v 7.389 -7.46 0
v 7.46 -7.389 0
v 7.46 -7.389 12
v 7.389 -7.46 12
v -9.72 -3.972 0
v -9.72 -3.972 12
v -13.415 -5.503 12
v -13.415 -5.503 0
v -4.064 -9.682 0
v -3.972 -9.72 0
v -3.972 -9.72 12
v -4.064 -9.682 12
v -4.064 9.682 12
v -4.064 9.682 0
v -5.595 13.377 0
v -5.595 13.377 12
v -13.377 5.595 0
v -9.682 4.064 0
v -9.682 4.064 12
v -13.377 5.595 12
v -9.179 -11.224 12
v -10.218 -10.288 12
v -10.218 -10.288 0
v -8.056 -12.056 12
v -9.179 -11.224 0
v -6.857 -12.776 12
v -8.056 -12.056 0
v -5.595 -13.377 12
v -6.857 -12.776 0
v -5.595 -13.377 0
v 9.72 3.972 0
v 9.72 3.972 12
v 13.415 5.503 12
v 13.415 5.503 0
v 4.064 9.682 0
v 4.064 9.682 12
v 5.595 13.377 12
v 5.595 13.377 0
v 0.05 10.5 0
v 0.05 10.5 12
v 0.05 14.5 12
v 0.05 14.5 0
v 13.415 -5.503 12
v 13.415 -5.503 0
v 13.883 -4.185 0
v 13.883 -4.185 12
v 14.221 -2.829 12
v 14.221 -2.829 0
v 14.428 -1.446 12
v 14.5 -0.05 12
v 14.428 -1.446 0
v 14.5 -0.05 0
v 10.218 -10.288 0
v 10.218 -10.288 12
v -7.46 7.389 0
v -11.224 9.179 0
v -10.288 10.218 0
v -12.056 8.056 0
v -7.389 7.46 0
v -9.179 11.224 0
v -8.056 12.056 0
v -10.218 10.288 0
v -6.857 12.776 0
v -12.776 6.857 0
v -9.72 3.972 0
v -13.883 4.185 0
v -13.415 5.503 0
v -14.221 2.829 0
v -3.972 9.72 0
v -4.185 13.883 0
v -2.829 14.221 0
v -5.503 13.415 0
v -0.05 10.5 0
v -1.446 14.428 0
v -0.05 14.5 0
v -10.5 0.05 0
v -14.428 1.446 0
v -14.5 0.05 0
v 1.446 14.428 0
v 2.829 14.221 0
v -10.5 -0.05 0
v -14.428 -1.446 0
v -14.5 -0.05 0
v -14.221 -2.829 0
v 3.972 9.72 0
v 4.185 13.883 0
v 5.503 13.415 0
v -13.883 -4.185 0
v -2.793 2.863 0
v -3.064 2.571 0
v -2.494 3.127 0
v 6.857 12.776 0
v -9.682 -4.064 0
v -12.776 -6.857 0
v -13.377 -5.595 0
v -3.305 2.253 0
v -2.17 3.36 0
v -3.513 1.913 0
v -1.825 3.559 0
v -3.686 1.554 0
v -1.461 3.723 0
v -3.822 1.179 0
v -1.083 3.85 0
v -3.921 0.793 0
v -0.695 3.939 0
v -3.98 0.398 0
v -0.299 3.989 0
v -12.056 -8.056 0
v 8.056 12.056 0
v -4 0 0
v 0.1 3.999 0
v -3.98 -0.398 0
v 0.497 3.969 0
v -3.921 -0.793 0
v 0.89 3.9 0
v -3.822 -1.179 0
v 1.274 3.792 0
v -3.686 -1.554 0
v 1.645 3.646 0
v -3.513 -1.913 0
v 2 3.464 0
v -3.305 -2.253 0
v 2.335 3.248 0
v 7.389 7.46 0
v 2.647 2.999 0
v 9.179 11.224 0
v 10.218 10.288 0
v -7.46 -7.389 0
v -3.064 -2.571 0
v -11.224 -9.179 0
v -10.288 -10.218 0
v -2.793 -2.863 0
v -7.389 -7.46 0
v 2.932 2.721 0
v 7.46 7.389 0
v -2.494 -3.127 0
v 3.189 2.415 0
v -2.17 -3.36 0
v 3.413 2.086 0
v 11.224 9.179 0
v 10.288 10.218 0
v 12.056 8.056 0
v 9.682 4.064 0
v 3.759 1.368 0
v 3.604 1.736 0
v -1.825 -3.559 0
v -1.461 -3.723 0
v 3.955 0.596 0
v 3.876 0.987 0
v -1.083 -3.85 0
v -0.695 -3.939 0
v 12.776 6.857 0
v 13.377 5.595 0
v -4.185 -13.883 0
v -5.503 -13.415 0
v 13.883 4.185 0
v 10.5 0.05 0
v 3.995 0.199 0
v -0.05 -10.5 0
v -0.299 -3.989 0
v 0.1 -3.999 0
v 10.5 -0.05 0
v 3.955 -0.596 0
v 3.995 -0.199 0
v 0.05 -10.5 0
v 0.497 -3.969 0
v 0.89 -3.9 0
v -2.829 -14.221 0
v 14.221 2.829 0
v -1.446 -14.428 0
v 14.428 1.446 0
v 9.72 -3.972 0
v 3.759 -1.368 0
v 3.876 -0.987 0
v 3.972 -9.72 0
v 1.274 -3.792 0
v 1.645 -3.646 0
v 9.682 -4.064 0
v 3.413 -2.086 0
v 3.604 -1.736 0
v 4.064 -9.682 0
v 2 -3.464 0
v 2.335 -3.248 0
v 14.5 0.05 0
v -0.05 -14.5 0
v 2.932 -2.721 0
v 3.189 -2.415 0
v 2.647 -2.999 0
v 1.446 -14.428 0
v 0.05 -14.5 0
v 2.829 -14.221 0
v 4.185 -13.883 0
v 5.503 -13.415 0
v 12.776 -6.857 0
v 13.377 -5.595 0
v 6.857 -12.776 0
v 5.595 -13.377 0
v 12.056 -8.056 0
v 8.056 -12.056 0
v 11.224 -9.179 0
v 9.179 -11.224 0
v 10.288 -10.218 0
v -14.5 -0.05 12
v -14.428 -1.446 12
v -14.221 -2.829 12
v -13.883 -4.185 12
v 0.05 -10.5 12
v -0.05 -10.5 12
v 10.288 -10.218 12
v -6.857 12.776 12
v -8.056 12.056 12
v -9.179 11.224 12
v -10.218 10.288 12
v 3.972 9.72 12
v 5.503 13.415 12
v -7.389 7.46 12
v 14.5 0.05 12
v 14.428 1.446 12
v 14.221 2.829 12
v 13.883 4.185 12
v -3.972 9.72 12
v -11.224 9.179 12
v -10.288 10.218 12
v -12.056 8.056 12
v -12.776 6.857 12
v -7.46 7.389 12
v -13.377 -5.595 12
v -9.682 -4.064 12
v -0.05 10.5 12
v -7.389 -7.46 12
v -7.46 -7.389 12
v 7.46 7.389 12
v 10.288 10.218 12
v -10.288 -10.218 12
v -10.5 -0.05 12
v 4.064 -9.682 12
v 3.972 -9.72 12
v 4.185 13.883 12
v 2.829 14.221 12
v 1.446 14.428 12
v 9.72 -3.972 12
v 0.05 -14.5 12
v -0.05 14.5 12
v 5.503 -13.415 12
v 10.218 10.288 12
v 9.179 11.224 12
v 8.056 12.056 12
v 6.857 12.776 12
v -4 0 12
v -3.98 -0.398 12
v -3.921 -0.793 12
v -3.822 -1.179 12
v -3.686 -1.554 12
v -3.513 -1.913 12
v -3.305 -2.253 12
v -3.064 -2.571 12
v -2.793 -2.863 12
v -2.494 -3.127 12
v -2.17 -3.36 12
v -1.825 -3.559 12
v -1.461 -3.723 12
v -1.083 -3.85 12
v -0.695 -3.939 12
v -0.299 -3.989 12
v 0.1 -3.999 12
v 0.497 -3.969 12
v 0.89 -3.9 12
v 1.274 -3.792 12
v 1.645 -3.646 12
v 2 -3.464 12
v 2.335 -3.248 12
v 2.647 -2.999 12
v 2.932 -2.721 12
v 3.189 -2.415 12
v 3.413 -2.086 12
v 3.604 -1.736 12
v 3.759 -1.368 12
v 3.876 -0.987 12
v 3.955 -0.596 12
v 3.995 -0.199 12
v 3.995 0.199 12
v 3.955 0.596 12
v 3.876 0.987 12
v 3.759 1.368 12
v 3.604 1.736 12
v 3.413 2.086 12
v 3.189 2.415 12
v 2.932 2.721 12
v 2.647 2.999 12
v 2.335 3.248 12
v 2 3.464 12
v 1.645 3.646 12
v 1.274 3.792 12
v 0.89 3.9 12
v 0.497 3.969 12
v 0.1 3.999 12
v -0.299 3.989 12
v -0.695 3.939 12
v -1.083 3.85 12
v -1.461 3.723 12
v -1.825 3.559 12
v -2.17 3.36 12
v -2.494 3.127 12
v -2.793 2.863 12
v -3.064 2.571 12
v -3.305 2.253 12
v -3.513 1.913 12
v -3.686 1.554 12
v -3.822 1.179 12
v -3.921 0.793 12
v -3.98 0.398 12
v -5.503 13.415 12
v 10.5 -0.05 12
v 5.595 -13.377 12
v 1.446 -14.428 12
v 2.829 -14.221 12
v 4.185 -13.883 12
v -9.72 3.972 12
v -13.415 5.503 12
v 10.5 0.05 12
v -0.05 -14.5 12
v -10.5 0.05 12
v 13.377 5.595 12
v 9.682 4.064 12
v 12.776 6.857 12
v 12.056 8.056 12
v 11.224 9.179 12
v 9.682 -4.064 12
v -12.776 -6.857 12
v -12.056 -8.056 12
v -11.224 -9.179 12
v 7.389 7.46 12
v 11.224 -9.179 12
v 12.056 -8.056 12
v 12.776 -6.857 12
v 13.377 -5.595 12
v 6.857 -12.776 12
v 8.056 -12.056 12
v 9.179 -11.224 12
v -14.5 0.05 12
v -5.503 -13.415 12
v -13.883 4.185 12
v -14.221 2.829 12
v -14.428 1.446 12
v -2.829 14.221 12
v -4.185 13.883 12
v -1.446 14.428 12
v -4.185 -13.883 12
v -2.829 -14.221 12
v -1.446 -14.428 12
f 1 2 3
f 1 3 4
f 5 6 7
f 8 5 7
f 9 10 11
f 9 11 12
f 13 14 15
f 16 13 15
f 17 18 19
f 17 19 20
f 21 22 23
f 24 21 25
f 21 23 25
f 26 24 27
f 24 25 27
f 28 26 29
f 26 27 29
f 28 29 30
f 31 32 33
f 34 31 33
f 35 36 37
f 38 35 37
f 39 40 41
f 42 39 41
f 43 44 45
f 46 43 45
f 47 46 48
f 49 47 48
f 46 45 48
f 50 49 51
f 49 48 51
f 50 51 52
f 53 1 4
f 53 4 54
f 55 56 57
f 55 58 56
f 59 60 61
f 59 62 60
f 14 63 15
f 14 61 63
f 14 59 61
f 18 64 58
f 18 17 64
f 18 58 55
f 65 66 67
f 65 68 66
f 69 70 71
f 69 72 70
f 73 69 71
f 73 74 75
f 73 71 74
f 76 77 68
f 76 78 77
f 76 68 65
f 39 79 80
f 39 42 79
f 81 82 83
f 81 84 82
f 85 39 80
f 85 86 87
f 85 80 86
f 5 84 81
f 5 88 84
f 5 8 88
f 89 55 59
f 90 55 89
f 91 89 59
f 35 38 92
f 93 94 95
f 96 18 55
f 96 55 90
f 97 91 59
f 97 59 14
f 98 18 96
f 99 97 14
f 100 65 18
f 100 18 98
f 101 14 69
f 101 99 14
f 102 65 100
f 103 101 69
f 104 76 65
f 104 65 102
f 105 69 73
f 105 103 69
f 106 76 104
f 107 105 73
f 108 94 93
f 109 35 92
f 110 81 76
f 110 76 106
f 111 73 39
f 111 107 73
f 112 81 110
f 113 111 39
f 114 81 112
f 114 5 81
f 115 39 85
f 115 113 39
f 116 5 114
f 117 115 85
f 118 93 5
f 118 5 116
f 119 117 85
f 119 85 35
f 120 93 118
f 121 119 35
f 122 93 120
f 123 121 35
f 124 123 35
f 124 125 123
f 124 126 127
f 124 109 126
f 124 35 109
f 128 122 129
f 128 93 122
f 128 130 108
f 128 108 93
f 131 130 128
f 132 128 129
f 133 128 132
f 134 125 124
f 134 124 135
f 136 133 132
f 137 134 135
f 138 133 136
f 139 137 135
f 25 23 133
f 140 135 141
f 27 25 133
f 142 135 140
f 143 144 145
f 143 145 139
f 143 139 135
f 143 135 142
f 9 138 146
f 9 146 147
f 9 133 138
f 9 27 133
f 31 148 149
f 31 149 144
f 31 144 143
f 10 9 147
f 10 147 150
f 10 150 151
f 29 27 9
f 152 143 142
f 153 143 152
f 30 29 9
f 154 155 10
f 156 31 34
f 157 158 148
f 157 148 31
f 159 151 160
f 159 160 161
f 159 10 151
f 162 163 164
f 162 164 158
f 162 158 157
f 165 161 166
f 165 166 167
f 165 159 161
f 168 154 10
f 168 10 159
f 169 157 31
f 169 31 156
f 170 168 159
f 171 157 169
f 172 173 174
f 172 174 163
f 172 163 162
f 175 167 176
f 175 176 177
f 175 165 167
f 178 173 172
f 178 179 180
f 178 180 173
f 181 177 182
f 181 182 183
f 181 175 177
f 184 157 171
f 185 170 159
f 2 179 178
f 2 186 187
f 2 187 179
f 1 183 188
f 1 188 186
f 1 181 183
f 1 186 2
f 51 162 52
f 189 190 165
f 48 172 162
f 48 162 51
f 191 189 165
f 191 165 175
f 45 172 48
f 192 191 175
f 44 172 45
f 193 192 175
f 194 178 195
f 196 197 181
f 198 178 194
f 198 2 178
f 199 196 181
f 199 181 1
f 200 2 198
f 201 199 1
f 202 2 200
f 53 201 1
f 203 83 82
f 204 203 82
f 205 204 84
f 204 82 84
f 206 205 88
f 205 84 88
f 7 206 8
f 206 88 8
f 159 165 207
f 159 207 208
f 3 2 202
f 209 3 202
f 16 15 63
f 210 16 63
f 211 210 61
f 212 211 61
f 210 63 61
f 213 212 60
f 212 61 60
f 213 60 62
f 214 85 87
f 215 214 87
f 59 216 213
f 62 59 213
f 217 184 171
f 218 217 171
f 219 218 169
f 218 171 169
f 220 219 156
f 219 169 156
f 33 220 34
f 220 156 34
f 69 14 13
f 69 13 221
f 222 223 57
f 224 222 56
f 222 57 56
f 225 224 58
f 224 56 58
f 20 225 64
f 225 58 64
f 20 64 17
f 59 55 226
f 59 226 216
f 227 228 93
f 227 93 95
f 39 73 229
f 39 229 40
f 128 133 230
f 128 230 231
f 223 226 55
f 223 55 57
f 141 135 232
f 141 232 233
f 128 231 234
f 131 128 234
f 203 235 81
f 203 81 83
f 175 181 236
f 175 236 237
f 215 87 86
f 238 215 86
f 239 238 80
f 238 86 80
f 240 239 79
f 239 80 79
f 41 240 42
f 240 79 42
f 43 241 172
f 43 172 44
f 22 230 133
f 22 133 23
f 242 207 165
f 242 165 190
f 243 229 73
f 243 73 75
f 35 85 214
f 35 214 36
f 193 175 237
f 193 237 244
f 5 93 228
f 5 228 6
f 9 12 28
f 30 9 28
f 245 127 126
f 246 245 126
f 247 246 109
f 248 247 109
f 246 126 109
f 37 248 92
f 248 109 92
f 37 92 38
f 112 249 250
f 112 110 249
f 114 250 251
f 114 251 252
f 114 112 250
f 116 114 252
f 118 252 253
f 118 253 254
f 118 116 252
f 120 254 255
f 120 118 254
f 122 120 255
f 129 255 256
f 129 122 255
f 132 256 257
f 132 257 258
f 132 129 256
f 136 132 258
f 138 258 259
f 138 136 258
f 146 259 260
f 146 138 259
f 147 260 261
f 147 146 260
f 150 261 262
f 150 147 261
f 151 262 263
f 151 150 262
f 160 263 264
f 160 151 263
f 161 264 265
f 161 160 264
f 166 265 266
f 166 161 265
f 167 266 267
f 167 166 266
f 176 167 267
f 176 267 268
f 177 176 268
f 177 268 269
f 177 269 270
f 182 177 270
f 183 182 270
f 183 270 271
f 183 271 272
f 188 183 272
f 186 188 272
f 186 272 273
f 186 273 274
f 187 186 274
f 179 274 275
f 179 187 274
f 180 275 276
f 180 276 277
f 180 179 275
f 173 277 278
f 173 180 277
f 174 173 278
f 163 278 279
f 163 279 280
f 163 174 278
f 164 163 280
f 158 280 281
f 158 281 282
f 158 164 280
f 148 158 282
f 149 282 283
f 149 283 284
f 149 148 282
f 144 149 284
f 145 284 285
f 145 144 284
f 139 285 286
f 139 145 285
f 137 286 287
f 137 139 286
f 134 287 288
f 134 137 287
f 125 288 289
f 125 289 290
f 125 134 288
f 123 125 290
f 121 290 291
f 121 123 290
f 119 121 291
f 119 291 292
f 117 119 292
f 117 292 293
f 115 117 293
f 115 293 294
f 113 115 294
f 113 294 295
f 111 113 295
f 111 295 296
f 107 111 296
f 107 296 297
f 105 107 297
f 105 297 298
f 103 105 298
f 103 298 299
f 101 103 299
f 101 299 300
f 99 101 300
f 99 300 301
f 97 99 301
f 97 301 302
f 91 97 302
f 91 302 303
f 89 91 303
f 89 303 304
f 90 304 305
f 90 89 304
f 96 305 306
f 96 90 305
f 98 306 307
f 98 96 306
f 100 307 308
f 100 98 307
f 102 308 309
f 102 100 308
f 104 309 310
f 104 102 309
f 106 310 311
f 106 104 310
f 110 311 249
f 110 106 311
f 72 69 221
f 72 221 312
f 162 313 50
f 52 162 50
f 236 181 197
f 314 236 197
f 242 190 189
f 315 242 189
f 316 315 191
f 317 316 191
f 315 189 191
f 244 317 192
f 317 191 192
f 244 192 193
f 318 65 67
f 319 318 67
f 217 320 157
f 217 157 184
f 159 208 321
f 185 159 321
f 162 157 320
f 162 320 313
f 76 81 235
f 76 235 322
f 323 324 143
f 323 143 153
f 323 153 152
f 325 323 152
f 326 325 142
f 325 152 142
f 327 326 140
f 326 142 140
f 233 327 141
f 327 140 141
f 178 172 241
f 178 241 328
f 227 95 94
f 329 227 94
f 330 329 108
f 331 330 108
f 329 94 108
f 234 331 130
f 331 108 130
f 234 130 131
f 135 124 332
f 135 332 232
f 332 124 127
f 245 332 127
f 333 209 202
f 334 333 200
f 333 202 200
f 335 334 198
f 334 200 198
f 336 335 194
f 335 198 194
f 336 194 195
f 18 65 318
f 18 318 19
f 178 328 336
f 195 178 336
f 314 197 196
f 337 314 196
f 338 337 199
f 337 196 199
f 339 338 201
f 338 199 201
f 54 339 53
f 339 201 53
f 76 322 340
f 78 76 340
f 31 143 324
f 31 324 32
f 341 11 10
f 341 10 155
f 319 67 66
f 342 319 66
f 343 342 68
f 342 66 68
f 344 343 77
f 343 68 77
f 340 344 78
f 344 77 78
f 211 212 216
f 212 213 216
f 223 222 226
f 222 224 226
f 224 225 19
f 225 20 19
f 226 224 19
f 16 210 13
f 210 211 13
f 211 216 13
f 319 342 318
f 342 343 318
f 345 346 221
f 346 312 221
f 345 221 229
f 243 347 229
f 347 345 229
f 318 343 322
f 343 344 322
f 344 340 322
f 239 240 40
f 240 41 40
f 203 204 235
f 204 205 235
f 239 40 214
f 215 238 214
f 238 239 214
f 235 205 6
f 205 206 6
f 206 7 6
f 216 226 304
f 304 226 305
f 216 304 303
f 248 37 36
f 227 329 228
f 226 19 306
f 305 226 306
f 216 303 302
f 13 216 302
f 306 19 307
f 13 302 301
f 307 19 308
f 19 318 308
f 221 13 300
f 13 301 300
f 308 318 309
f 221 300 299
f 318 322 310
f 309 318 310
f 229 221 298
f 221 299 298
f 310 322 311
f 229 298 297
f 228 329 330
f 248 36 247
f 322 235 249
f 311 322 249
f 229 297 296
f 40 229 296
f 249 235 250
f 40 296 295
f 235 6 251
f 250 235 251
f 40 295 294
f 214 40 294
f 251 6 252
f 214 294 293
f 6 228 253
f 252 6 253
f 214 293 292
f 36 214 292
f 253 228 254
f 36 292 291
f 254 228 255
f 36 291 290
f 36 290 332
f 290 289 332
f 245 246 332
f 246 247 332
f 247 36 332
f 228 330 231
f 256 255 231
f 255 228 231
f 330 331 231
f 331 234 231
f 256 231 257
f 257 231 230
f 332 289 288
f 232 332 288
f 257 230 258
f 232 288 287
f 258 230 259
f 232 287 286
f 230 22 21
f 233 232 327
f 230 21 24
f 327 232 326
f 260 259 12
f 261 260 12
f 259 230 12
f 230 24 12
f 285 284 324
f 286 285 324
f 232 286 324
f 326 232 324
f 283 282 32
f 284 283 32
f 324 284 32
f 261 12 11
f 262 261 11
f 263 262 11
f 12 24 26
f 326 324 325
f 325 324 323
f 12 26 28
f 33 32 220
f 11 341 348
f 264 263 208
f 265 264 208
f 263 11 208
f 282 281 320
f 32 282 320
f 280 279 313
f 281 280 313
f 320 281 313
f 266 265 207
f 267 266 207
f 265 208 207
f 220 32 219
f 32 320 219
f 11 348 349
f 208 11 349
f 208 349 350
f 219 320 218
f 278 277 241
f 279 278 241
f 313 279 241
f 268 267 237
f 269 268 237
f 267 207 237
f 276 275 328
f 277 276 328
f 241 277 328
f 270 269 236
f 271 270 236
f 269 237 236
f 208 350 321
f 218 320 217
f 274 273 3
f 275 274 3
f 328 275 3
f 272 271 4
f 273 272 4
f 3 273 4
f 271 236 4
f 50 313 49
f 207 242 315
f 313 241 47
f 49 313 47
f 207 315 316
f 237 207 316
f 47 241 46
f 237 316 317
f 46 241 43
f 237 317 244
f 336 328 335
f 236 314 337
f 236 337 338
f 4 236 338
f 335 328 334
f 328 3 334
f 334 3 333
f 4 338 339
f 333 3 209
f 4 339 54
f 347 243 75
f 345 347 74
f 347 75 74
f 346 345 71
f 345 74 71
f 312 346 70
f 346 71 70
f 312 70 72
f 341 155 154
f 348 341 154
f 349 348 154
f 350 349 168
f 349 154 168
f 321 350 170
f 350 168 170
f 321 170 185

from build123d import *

# Parameters (mm, degrees)
ESQUISSE1_W                  = 12
ESQUISSE1_H                  = 10.5
ESQUISSE2_W                  = 0.1
ESQUISSE2_H                  = 4
ENL_V_MAT_EXTRU_2_DEPTH      = 24.759208741
R_P_TITION_CIRCULAIRE1_COUNT = 16


with BuildPart() as part:
    # Esquisse1 → Révolution1 (revolve)
    with BuildSketch(Plane(origin=(0, 0, 0), x_dir=(0, 0, -1), z_dir=(1, 0, 0))):
        with Locations((-6, 9.25)):
            Rectangle(ESQUISSE1_W, ESQUISSE1_H)
    revolve(axis=Axis((0, 0, 0), (0, 0, 1)))

    # Esquisse2 → Enlèv. mat.-Extru.2 (cut, through all)
    with BuildSketch(Plane.XY):
        with Locations((0, 12.5)):
            Rectangle(ESQUISSE2_W, ESQUISSE2_H)
    enl_v_mat_extru_2 = extrude(amount=ENL_V_MAT_EXTRU_2_DEPTH, mode=Mode.SUBTRACT)

    # Répétition circulaire1: Enlèv. mat.-Extru.2 ×16 about axis
    r_p_tition_circulaire1_axis = Axis((0, 0, 0), (0, 0, 1))
    for i in range(1, R_P_TITION_CIRCULAIRE1_COUNT):
        add(enl_v_mat_extru_2.rotate(r_p_tition_circulaire1_axis, i * 360 / R_P_TITION_CIRCULAIRE1_COUNT), mode=Mode.SUBTRACT)


solid = part.part
